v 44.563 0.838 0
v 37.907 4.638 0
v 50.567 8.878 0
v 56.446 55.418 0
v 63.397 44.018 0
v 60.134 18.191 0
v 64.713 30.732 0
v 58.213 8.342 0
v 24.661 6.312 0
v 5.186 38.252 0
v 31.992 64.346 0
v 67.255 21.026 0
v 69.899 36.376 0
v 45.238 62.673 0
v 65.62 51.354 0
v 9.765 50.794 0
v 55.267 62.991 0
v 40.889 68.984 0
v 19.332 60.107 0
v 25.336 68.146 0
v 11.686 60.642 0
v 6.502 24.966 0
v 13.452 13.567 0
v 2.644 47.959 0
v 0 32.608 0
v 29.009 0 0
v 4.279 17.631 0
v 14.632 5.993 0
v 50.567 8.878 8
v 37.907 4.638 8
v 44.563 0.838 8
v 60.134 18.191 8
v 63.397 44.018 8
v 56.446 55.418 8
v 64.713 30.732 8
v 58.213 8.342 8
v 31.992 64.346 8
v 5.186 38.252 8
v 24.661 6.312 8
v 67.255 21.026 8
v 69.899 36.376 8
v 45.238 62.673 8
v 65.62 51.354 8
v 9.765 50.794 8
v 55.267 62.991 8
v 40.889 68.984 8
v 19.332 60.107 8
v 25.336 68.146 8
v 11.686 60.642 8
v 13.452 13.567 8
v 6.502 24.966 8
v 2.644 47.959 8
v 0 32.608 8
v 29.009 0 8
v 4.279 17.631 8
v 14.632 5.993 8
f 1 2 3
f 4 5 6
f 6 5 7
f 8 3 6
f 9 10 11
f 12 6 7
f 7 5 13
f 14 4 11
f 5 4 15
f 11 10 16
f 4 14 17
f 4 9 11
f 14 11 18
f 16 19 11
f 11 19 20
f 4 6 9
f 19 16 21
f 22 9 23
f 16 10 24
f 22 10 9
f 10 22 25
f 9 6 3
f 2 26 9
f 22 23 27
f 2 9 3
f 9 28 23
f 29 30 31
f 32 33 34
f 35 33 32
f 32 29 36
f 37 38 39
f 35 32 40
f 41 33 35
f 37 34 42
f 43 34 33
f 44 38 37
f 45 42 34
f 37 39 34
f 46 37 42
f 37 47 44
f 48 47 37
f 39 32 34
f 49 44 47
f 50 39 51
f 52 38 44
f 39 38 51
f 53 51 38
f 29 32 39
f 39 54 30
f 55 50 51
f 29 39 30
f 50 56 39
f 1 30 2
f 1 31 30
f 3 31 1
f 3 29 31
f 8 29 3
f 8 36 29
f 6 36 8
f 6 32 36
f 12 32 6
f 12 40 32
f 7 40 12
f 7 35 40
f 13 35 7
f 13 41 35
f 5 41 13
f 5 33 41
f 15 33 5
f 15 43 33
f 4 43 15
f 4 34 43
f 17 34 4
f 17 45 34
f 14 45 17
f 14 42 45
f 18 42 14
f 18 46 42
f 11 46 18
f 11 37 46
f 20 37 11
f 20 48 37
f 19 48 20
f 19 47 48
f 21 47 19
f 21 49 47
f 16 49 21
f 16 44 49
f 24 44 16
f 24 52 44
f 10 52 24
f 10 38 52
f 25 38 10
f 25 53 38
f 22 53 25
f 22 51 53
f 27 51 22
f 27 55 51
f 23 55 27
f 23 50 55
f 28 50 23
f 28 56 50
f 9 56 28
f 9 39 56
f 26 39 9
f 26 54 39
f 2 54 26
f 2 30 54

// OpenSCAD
$fn = 32;

// ----------------------------------------------------------------------
// Chain sprocket: 14 teeth, 30 mm root radius
// ----------------------------------------------------------------------

// --- parameters (mm) ---
profile_height = 8;       // extrusion height
profile_points = 28;      // points of the closed outline

profile = [[64.713, 30.732], [69.899, 36.376], [63.397, 44.018], [65.62, 51.354], [56.446, 55.418], [55.267, 62.991], [45.238, 62.673], [40.889, 68.984], [31.992, 64.346], [25.336, 68.146], [19.332, 60.107], [11.686, 60.642], [9.765, 50.794], [2.644, 47.959], [5.186, 38.252], [0, 32.608], [6.502, 24.966], [4.279, 17.631], [13.452, 13.567], [14.632, 5.993], [24.661, 6.312], [29.009, 0], [37.907, 4.638], [44.563, 0.838], [50.567, 8.878], [58.213, 8.342], [60.134, 18.191], [67.255, 21.026]];  // single closed polygon, 28 points, counter clockwise

// --- the one profile operation ---
linear_extrude(height = profile_height) polygon(points = profile);
